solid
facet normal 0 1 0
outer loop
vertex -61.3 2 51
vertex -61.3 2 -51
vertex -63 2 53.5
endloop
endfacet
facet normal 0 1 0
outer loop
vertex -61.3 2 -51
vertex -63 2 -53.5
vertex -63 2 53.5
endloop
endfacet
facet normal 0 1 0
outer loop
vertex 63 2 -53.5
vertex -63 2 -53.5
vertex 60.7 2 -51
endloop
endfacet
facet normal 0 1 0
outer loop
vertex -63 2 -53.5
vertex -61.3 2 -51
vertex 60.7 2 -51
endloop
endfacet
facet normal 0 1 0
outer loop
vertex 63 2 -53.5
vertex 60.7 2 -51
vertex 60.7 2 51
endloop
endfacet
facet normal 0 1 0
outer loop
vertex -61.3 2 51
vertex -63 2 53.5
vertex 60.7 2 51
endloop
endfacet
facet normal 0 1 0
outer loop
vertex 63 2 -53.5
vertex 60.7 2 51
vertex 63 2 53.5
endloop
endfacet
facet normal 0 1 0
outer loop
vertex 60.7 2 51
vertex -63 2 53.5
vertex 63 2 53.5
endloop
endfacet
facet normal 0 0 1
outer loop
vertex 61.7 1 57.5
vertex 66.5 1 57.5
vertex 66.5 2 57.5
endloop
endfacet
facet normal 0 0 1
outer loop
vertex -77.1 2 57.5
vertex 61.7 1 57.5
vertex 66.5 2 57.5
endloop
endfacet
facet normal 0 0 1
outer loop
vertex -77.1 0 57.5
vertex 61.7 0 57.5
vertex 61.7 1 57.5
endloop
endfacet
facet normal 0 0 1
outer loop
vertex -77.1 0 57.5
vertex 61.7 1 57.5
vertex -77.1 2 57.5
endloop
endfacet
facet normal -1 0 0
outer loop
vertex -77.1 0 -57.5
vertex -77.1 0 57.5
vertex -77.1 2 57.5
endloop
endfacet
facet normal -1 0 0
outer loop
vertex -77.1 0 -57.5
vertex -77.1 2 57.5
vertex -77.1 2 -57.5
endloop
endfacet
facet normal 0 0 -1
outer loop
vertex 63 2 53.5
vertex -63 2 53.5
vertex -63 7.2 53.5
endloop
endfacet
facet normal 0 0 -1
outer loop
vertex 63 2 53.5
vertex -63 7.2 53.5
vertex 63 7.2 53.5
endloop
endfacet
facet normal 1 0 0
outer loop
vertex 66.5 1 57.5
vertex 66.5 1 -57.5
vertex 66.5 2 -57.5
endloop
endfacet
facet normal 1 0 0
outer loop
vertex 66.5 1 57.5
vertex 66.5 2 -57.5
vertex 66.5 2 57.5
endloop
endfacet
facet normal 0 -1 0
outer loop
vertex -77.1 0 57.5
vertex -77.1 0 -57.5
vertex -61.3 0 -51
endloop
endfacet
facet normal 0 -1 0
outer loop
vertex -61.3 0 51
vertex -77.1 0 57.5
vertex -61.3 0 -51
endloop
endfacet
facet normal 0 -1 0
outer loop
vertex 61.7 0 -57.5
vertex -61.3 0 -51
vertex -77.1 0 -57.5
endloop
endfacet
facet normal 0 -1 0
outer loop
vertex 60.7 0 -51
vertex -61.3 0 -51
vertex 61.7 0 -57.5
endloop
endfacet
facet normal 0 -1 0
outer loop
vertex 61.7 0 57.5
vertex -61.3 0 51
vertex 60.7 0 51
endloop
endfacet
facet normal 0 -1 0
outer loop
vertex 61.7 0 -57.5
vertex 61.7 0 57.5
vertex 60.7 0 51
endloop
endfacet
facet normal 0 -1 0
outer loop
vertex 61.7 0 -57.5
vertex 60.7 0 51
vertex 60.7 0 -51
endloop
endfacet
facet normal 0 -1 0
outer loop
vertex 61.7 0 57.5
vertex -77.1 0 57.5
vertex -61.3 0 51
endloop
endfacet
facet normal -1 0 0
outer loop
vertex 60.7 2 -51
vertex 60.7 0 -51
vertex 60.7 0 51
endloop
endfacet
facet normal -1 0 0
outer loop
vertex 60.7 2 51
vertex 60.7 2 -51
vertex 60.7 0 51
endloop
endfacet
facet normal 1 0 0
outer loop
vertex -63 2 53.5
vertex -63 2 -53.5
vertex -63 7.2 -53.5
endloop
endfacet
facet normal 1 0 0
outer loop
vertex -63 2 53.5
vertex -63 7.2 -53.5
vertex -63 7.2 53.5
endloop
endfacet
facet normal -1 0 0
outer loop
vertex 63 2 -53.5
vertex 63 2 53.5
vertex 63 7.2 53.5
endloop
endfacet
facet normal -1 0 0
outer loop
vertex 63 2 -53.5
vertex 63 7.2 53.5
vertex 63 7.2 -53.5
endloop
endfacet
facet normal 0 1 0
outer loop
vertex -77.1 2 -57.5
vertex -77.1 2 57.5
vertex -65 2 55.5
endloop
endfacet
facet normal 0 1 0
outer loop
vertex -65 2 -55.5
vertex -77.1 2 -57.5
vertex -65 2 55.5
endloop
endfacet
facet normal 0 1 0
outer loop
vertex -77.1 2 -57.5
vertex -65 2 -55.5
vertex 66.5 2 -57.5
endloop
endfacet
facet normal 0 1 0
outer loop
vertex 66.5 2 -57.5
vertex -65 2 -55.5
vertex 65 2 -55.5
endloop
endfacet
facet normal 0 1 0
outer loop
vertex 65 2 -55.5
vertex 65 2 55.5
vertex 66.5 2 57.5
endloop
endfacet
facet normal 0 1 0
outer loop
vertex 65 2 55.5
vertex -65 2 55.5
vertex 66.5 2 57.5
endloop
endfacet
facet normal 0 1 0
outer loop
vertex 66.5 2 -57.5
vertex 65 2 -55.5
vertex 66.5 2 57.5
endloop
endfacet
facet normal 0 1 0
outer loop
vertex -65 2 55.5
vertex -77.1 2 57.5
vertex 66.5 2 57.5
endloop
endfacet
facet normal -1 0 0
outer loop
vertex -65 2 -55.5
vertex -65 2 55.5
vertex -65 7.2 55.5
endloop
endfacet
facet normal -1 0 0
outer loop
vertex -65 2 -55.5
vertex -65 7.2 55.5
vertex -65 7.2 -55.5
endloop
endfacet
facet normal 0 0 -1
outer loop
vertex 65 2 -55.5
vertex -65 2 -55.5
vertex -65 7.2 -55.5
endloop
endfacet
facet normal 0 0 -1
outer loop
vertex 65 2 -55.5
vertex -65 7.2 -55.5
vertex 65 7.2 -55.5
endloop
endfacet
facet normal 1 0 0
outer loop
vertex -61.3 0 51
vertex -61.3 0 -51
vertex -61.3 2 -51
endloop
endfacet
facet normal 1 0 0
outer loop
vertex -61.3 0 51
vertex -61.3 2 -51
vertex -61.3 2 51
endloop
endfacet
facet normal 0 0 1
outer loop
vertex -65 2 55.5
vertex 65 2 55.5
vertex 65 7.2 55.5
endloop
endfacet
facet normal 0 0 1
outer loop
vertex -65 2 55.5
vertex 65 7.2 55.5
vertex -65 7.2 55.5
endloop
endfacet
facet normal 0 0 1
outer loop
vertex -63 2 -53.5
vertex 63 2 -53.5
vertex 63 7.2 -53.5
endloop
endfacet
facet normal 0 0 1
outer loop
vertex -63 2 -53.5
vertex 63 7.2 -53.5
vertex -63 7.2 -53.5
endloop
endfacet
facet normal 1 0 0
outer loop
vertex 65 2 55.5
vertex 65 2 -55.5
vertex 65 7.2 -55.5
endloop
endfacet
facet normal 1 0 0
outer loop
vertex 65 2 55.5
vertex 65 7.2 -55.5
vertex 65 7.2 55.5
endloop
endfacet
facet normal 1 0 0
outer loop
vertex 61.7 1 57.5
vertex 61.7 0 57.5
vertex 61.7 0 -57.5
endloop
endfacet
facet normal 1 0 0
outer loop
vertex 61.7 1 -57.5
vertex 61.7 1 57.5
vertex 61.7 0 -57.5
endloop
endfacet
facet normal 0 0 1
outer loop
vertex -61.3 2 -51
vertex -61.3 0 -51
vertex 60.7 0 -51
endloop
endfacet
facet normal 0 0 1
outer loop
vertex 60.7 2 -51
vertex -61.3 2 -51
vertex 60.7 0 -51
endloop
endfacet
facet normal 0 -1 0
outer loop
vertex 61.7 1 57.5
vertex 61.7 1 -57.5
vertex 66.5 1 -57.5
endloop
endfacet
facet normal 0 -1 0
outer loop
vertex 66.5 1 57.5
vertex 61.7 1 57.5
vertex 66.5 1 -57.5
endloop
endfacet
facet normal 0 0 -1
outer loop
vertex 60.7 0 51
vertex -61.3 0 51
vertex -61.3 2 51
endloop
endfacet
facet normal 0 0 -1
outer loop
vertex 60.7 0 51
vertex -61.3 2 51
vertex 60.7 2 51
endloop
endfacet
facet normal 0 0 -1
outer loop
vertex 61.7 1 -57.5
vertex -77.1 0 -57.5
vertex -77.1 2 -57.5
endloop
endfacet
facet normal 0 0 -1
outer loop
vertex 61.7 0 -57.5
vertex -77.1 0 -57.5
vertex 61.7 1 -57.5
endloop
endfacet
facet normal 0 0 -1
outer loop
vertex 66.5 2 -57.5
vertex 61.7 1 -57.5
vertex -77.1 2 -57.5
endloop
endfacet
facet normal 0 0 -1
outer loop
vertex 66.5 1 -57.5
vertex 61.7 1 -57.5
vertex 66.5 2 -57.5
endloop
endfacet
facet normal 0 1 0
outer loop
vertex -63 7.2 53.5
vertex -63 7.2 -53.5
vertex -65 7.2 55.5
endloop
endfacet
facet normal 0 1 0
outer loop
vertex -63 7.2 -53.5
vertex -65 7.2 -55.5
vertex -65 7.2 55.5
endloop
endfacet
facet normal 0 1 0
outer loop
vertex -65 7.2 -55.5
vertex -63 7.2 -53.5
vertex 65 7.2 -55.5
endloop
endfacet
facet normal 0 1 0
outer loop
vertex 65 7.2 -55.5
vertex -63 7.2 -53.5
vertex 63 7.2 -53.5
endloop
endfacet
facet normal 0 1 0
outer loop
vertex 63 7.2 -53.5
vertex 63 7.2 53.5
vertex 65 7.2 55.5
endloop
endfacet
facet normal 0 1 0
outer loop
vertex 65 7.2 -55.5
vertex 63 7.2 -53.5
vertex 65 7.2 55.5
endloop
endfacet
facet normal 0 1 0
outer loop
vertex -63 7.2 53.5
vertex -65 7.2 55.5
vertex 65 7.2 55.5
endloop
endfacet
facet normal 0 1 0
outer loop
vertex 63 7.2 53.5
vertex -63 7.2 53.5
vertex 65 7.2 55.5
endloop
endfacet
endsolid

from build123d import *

# Parameters (mm, degrees)
F0_W          = 124.7
F0_H          = 107
F0_W_2        = 122
F0_H_2        = 102
F0_W_3        = 1.3
F1_DEPTH      = 2
F2_DEPTH      = 7.2
F3_DEPTH      = 1
F3_DEPTH_BACK = 2


with BuildPart() as f1:
    # F0 (on Front) → F1 (new body)
    with BuildSketch(Plane.XZ):
        Polygon((-77.1, -57.5), (61.7, -57.5), (61.7, -55.5), (-65, -55.5), (-65, 55.5), (61.7, 55.5), (61.7, 57.5), (-77.1, 57.5), align=None)
        Polygon((61.7, -53.5), (61.7, -55.5), (65, -55.5), (65, 55.5), (61.7, 55.5), (61.7, 53.5), (63, 53.5), (63, -53.5), align=None)
        Polygon((-65, -55.5), (61.7, -55.5), (61.7, -53.5), (-63, -53.5), (-63, 53.5), (61.7, 53.5), (61.7, 55.5), (-65, 55.5), align=None)
        with Locations((-0.65, 0)):
            Rectangle(F0_W, F0_H)
        with Locations((-0.3, 0)):
            Rectangle(F0_W_2, F0_H_2, mode=Mode.SUBTRACT)
        Polygon((61.7, -57.5), (66.5, -57.5), (66.5, 57.5), (61.7, 57.5), (61.7, 55.5), (65, 55.5), (65, -55.5), (61.7, -55.5), align=None)
        with Locations((62.35, 0)):
            Rectangle(F0_W_3, F0_H)
    extrude(amount=-F1_DEPTH)

    # F0 (on Front) → F2 (join)
    with BuildSketch(Plane.XZ):
        Polygon((61.7, -53.5), (61.7, -55.5), (65, -55.5), (65, 55.5), (61.7, 55.5), (61.7, 53.5), (63, 53.5), (63, -53.5), align=None)
        Polygon((-65, -55.5), (61.7, -55.5), (61.7, -53.5), (-63, -53.5), (-63, 53.5), (61.7, 53.5), (61.7, 55.5), (-65, 55.5), align=None)
    extrude(amount=-F2_DEPTH)

    # F0 (on Front) → F3 (cut, two sides)
    with BuildSketch(Plane.XZ) as f3_sk:
        Polygon((61.7, -57.5), (66.5, -57.5), (66.5, 57.5), (61.7, 57.5), (61.7, 55.5), (65, 55.5), (65, -55.5), (61.7, -55.5), align=None)
        with Locations((62.35, 0)):
            Rectangle(F0_W_3, F0_H)
        Polygon((61.7, -53.5), (61.7, -55.5), (65, -55.5), (65, 55.5), (61.7, 55.5), (61.7, 53.5), (63, 53.5), (63, -53.5), align=None)
    extrude(amount=-F3_DEPTH, mode=Mode.SUBTRACT)
    extrude(f3_sk.sketch, amount=F3_DEPTH_BACK, mode=Mode.SUBTRACT)


solid = f1.part
